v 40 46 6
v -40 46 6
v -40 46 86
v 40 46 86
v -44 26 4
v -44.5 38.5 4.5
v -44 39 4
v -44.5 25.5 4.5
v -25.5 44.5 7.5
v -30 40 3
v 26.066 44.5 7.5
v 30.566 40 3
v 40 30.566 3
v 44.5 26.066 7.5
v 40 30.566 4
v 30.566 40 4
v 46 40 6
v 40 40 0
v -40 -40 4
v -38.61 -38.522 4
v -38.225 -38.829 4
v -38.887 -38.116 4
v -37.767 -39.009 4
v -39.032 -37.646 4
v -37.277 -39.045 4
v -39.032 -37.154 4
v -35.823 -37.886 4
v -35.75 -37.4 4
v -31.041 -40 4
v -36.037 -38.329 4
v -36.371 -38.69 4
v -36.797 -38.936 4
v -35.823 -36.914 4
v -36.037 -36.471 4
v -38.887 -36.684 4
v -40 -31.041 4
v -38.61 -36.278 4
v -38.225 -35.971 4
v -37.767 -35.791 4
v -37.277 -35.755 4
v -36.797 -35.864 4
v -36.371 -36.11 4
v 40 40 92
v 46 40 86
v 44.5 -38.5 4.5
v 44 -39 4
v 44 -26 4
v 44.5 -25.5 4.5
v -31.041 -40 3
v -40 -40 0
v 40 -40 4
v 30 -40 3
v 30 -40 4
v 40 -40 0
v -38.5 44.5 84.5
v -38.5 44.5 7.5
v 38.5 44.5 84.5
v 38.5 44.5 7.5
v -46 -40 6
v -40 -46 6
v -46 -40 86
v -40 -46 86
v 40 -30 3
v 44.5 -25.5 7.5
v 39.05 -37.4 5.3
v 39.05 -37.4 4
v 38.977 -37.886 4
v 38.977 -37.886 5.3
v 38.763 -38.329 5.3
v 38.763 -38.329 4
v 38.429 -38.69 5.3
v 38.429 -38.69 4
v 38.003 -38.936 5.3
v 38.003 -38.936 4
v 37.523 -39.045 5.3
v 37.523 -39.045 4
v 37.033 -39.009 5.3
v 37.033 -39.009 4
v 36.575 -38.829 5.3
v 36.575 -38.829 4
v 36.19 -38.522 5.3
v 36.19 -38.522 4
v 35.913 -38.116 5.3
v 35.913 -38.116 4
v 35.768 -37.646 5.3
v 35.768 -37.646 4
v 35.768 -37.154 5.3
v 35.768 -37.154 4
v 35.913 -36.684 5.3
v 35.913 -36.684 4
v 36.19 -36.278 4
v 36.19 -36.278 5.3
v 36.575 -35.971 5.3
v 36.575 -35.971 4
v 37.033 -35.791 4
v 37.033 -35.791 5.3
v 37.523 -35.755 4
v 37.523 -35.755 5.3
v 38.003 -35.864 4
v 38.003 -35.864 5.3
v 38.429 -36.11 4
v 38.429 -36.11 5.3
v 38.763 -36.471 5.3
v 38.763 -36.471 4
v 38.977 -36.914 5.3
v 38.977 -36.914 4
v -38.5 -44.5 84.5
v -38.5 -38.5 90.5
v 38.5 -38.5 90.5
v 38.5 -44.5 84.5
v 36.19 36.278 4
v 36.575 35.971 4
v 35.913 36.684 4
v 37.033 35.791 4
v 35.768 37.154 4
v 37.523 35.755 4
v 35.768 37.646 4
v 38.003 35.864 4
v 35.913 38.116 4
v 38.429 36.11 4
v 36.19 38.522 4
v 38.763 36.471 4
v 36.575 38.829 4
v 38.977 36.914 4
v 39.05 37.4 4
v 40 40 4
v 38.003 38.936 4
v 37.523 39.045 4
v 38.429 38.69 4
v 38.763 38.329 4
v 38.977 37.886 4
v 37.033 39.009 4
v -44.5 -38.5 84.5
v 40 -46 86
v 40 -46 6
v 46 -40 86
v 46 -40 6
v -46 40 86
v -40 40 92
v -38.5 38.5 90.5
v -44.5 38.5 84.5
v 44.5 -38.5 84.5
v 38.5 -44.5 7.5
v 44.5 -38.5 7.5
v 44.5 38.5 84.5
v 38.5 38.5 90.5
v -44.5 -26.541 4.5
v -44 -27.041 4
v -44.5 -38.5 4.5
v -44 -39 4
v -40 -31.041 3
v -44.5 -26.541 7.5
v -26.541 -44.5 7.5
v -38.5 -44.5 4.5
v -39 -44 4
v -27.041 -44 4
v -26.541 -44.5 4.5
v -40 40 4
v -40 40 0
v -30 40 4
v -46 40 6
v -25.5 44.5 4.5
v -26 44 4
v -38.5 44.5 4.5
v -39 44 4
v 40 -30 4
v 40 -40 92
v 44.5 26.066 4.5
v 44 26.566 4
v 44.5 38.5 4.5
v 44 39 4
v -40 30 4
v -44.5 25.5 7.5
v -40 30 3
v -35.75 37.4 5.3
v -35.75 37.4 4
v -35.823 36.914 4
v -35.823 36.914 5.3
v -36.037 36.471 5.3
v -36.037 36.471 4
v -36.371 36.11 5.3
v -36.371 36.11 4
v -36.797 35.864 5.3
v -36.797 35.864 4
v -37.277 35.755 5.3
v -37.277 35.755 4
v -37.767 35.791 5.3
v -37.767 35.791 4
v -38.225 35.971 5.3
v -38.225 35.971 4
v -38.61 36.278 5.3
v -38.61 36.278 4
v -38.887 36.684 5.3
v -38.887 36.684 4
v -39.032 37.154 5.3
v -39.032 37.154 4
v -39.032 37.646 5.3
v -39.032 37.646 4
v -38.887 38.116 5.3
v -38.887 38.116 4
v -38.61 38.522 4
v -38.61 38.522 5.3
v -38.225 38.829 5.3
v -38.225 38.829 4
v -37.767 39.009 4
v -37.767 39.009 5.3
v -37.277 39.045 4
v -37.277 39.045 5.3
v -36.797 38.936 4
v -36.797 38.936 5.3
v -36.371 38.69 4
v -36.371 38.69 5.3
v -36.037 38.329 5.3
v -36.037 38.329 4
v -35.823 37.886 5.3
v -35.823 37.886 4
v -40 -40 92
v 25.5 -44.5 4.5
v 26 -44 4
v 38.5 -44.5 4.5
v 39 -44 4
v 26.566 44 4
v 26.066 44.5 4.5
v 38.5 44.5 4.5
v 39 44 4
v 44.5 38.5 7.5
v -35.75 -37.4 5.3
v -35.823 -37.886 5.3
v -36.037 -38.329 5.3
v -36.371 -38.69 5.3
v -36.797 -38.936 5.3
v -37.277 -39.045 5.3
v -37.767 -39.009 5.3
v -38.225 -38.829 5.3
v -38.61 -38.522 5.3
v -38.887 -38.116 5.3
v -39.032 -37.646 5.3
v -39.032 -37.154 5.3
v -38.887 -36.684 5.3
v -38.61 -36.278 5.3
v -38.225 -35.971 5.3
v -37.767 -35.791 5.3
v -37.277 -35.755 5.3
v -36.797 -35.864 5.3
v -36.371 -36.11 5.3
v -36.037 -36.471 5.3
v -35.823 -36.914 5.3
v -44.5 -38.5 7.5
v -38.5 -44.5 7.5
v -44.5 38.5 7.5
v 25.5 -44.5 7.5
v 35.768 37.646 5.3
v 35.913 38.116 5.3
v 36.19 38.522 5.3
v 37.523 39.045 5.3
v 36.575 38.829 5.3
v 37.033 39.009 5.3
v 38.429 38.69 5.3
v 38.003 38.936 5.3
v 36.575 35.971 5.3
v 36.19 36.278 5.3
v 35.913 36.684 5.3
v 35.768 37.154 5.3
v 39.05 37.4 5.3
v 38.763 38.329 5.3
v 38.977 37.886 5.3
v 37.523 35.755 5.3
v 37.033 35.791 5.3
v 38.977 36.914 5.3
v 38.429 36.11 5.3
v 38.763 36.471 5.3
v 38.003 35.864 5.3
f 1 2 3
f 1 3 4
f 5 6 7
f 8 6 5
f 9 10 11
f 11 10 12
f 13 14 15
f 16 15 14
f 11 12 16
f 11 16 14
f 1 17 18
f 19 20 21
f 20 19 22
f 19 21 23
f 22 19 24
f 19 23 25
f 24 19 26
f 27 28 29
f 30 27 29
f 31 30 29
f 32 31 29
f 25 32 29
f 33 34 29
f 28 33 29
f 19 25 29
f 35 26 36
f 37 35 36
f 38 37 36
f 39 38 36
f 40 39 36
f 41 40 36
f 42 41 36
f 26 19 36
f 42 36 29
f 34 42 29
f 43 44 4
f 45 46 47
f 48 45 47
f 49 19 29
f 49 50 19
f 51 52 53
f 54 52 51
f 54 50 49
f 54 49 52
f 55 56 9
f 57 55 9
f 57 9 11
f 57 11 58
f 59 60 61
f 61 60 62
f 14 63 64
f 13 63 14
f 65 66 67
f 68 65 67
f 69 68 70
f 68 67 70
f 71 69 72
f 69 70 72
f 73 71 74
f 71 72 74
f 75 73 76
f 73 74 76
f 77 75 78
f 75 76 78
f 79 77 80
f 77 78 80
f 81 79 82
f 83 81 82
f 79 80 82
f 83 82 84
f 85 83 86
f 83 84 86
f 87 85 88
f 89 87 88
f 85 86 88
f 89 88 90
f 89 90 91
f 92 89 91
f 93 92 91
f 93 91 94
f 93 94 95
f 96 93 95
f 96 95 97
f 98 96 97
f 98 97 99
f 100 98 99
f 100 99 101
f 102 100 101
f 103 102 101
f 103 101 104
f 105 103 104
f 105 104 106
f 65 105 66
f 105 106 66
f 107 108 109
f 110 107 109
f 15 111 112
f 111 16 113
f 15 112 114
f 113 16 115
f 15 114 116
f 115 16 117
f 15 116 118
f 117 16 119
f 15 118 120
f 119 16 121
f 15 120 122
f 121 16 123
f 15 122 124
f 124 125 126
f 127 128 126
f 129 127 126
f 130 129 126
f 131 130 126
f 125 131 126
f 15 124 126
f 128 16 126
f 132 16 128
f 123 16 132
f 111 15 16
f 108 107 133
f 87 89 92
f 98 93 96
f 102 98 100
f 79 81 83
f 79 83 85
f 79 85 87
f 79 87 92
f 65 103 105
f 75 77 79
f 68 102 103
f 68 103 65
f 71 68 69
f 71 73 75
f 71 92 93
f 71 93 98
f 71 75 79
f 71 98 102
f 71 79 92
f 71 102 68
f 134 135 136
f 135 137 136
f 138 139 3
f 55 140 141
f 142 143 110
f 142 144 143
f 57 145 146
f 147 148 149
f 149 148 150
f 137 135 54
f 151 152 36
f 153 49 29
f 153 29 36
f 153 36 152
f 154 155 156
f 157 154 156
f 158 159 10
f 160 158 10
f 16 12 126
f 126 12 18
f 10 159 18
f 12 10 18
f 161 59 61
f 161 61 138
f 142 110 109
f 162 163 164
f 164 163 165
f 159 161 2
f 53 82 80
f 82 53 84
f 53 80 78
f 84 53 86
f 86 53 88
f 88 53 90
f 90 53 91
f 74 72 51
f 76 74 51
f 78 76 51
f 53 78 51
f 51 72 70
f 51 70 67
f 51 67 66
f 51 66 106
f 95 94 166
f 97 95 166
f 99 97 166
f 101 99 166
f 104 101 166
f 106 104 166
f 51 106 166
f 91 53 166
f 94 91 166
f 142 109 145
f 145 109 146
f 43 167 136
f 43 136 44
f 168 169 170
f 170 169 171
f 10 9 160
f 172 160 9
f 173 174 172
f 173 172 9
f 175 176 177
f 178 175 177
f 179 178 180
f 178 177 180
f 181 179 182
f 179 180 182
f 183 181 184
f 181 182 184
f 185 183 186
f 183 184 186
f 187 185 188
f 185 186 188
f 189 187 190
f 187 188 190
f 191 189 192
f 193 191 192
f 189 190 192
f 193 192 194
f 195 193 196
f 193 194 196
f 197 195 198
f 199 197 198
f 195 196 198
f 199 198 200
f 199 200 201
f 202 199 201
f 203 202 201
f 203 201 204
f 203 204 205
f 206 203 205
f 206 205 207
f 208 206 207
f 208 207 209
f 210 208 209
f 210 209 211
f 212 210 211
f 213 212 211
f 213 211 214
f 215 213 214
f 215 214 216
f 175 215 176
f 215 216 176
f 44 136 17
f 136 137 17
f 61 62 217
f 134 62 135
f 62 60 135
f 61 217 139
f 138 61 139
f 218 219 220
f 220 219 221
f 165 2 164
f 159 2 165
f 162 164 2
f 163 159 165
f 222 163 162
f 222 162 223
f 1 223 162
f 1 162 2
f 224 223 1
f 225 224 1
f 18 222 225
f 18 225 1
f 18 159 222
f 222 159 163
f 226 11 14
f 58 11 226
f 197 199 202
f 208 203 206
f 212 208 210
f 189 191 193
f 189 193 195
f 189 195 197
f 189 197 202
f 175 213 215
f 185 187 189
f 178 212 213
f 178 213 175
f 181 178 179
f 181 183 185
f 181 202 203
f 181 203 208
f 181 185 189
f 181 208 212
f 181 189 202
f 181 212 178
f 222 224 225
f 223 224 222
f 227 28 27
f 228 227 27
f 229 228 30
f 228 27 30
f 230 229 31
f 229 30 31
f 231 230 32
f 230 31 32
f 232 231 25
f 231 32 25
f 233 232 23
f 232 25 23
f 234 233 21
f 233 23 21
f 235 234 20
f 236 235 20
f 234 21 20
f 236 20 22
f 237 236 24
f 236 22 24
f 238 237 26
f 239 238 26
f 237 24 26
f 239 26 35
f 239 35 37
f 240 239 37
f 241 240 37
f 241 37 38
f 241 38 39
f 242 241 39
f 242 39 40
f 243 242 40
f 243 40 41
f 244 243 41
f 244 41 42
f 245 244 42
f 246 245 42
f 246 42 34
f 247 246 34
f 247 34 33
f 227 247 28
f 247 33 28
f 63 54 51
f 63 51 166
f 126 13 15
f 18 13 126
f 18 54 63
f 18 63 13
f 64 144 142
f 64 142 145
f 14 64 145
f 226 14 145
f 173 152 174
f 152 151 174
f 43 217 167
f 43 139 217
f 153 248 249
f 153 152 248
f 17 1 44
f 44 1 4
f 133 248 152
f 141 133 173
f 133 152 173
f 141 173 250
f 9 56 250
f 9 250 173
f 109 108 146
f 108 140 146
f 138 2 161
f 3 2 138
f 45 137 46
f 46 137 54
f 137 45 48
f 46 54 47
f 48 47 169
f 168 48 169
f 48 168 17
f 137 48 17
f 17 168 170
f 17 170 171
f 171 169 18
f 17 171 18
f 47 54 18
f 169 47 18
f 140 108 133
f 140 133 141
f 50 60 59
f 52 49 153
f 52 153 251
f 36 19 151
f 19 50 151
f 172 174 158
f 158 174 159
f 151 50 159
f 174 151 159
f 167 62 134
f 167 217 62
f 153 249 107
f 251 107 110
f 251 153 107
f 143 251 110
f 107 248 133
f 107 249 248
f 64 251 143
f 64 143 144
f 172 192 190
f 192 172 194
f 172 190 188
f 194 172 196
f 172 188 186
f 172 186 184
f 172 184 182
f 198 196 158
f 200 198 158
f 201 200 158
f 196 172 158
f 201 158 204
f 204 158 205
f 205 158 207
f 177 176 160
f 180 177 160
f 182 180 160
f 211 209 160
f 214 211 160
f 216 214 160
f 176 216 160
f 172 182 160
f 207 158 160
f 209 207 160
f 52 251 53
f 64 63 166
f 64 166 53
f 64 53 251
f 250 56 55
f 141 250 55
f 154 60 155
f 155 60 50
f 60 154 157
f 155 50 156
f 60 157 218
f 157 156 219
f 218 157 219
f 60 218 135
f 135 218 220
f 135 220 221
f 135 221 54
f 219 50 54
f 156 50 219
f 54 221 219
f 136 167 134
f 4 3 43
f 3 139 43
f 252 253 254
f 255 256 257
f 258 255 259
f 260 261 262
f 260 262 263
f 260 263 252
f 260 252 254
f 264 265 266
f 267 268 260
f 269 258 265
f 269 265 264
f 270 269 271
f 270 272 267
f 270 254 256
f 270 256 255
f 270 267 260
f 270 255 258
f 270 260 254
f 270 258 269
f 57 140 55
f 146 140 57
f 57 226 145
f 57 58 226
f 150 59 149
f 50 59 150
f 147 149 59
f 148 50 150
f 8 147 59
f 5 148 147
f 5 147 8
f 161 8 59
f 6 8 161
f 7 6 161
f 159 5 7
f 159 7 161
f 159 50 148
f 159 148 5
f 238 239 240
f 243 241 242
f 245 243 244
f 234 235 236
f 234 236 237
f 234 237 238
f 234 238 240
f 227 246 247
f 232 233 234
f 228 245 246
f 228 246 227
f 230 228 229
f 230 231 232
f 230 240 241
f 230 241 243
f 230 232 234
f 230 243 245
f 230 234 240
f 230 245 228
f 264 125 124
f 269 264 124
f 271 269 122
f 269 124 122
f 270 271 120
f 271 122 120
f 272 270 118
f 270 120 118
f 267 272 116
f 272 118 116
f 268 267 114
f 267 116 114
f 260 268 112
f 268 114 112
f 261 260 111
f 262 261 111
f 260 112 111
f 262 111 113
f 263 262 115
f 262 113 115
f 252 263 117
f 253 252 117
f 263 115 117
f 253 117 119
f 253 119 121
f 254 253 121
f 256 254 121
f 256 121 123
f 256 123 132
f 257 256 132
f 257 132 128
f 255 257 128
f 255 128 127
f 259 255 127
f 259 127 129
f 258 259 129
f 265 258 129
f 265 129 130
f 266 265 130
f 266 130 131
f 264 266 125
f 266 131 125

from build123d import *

# Parameters (mm, degrees)
F0_W      = 92
F0_H      = 92
F1_DEPTH  = 92
F2_SIZE   = 6
F3_DEPTH  = 80
F4_W      = 89
F4_H      = 89
F5_DEPTH  = 89
F6_SIZE   = 6
F17_DEPTH = 3.5
F10_R     = 1.65
F11_DEPTH = 1.3
F12_SIZE  = 0.49999
F15_DEPTH = 1.5


# Not quite as in the source:
# - a fillet or chamfer is up to 0.001 mm smaller than in the source, because OpenCascade refuses the exact size


with BuildPart() as f1:
    # F0 (on Top) → F1 (new body)
    with BuildSketch(Plane.XY):
        Rectangle(F0_W, F0_H)
    extrude(amount=F1_DEPTH)

    # F2
    f2_edges = [f1.edges().sort_by_distance(p)[0] for p in [
        (0, -46, 92),
        (46, 0, 92),
        (46, -46, 46),
        (0, -46, 0),
        (-46, -46, 46),
        (46, 0, 0),
        (46, 46, 46),
        (0, 46, 92),
        (-46, 0, 92),
        (-46, 0, 0),
        (-46, 46, 46),
        (0, 46, 0),
    ]]
    chamfer(f2_edges, length=F2_SIZE)

    # F3 (cut): a face of the model
    f3_faces = [f1.faces().sort_by_distance(p)[0] for p in [
        (0, 0, 0),
    ]]
    extrude(f3_faces, amount=-F3_DEPTH, mode=Mode.SUBTRACT)


with BuildPart() as f5:
    # F4 (on Top) → F5 (new body)
    with BuildSketch(Plane.XY):
        Rectangle(F4_W, F4_H)
    extrude(amount=F5_DEPTH)

    # F6
    f6_edges = [f5.edges().sort_by_distance(p)[0] for p in [
        (-44.5, -44.5, 44.5),
        (0, -44.5, 89),
        (44.5, -44.5, 44.5),
        (0, -44.5, 0),
        (44.5, 0, 89),
        (44.5, 44.5, 44.5),
        (44.5, 0, 0),
        (0, 44.5, 0),
        (-44.5, 0, 89),
        (0, 44.5, 89),
        (-44.5, 44.5, 44.5),
        (-44.5, 0, 0),
    ]]
    chamfer(f6_edges, length=F6_SIZE)


with BuildPart() as f5_1:
    # F7: moved
    add(f5.part.moved(Location((0, 0, 1.5))))


with BuildPart() as f1_1:
    add(f1.part)

    # F8: cut F5
    add(f5_1.part, mode=Mode.SUBTRACT)

    # F16 (on offset) → F17 (join)
    with BuildSketch(Plane.XY.offset(7.5)):
        Polygon((44.5, 26.0656665673), (44.5, 38.5), (38.5, 44.5), (26.0656665673, 44.5), (30.5656665673, 40), (40.5656665673, 30), align=None)
        Polygon((-25.5, 44.5), (-38.5, 44.5), (-44.5, 38.5), (-44.5, 25.5), (-40, 30), (-30, 40), align=None)
        Polygon((25.5, -44.5), (38.5, -44.5), (44.5, -38.5), (44.5, -25.5), (40, -30), (30, -40), align=None)
        Polygon((-44.5, -38.5), (-38.5, -44.5), (-26.5405371355, -44.5), (-30, -41.0405371355), (-40, -31.0405371355), (-44.5, -26.5405371355), align=None)
    extrude(amount=-F17_DEPTH)

    # F10 (on face) → F11 (cut)
    with BuildSketch(Plane(origin=(0, 0, 4), x_dir=(1, 0, 0), z_dir=(0, 0, -1))):
        with Locations((37.4, 37.4)):
            Circle(F10_R)
        with Locations((-37.4, 37.4)):
            Circle(F10_R)
        with Locations((-37.4, -37.4)):
            Circle(F10_R)
        with Locations((37.4, -37.4)):
            Circle(F10_R)
    extrude(amount=-F11_DEPTH, mode=Mode.SUBTRACT)

    # F12 (size 0.5 in the source; OpenCascade refuses exactly that, so slightly less here)
    f12_edges = [f1_1.edges().sort_by_distance(p)[0] for p in [
        (-32, 44.5, 4),
        (-44.5, 32, 4),
        (32.282833, 44.5, 4),
        (44.5, 32.282833, 4),
        (44.5, -32, 4),
        (-32.520269, -44.5, 4),
        (-44.5, -32.520269, 4),
        (32, -44.5, 4),
    ]]
    chamfer(f12_edges, length=F12_SIZE)

    # F14 (on face) → F15 (join)
    with BuildSketch(Plane(origin=(0, 0, 3), x_dir=(1, 0, 0), z_dir=(0, 0, -1))):
        Polygon((-41, 38.5), (-41, 30.0405371355), (-40, 31.0405371355), (-40, 39.5), (-40, 40), (-39.5, 40), (-31.0405371355, 40), (-30.0405371355, 41), (-38.5, 41), (-40, 41), (-41, 40), align=None)
        Polygon((38.5, 41), (29, 41), (30, 40), (39.5, 40), (40, 40), (40, 39.5), (40, 30), (41, 29), (41, 38.5), (41, 40), (40, 41), align=None)
        Polygon((41, -38.5), (41, -29.5656665673), (40, -30.5656665673), (40, -40), (30.5656665673, -40), (29.5656665673, -41), (38.5, -41), (40, -41), (41, -40), align=None)
        Polygon((-38.5, -41), (-29, -41), (-30, -40), (-40, -40), (-40, -30), (-41, -29), (-41, -38.5), (-41, -40), (-40, -41), align=None)
    extrude(amount=-F15_DEPTH)


solid = f1_1.part
